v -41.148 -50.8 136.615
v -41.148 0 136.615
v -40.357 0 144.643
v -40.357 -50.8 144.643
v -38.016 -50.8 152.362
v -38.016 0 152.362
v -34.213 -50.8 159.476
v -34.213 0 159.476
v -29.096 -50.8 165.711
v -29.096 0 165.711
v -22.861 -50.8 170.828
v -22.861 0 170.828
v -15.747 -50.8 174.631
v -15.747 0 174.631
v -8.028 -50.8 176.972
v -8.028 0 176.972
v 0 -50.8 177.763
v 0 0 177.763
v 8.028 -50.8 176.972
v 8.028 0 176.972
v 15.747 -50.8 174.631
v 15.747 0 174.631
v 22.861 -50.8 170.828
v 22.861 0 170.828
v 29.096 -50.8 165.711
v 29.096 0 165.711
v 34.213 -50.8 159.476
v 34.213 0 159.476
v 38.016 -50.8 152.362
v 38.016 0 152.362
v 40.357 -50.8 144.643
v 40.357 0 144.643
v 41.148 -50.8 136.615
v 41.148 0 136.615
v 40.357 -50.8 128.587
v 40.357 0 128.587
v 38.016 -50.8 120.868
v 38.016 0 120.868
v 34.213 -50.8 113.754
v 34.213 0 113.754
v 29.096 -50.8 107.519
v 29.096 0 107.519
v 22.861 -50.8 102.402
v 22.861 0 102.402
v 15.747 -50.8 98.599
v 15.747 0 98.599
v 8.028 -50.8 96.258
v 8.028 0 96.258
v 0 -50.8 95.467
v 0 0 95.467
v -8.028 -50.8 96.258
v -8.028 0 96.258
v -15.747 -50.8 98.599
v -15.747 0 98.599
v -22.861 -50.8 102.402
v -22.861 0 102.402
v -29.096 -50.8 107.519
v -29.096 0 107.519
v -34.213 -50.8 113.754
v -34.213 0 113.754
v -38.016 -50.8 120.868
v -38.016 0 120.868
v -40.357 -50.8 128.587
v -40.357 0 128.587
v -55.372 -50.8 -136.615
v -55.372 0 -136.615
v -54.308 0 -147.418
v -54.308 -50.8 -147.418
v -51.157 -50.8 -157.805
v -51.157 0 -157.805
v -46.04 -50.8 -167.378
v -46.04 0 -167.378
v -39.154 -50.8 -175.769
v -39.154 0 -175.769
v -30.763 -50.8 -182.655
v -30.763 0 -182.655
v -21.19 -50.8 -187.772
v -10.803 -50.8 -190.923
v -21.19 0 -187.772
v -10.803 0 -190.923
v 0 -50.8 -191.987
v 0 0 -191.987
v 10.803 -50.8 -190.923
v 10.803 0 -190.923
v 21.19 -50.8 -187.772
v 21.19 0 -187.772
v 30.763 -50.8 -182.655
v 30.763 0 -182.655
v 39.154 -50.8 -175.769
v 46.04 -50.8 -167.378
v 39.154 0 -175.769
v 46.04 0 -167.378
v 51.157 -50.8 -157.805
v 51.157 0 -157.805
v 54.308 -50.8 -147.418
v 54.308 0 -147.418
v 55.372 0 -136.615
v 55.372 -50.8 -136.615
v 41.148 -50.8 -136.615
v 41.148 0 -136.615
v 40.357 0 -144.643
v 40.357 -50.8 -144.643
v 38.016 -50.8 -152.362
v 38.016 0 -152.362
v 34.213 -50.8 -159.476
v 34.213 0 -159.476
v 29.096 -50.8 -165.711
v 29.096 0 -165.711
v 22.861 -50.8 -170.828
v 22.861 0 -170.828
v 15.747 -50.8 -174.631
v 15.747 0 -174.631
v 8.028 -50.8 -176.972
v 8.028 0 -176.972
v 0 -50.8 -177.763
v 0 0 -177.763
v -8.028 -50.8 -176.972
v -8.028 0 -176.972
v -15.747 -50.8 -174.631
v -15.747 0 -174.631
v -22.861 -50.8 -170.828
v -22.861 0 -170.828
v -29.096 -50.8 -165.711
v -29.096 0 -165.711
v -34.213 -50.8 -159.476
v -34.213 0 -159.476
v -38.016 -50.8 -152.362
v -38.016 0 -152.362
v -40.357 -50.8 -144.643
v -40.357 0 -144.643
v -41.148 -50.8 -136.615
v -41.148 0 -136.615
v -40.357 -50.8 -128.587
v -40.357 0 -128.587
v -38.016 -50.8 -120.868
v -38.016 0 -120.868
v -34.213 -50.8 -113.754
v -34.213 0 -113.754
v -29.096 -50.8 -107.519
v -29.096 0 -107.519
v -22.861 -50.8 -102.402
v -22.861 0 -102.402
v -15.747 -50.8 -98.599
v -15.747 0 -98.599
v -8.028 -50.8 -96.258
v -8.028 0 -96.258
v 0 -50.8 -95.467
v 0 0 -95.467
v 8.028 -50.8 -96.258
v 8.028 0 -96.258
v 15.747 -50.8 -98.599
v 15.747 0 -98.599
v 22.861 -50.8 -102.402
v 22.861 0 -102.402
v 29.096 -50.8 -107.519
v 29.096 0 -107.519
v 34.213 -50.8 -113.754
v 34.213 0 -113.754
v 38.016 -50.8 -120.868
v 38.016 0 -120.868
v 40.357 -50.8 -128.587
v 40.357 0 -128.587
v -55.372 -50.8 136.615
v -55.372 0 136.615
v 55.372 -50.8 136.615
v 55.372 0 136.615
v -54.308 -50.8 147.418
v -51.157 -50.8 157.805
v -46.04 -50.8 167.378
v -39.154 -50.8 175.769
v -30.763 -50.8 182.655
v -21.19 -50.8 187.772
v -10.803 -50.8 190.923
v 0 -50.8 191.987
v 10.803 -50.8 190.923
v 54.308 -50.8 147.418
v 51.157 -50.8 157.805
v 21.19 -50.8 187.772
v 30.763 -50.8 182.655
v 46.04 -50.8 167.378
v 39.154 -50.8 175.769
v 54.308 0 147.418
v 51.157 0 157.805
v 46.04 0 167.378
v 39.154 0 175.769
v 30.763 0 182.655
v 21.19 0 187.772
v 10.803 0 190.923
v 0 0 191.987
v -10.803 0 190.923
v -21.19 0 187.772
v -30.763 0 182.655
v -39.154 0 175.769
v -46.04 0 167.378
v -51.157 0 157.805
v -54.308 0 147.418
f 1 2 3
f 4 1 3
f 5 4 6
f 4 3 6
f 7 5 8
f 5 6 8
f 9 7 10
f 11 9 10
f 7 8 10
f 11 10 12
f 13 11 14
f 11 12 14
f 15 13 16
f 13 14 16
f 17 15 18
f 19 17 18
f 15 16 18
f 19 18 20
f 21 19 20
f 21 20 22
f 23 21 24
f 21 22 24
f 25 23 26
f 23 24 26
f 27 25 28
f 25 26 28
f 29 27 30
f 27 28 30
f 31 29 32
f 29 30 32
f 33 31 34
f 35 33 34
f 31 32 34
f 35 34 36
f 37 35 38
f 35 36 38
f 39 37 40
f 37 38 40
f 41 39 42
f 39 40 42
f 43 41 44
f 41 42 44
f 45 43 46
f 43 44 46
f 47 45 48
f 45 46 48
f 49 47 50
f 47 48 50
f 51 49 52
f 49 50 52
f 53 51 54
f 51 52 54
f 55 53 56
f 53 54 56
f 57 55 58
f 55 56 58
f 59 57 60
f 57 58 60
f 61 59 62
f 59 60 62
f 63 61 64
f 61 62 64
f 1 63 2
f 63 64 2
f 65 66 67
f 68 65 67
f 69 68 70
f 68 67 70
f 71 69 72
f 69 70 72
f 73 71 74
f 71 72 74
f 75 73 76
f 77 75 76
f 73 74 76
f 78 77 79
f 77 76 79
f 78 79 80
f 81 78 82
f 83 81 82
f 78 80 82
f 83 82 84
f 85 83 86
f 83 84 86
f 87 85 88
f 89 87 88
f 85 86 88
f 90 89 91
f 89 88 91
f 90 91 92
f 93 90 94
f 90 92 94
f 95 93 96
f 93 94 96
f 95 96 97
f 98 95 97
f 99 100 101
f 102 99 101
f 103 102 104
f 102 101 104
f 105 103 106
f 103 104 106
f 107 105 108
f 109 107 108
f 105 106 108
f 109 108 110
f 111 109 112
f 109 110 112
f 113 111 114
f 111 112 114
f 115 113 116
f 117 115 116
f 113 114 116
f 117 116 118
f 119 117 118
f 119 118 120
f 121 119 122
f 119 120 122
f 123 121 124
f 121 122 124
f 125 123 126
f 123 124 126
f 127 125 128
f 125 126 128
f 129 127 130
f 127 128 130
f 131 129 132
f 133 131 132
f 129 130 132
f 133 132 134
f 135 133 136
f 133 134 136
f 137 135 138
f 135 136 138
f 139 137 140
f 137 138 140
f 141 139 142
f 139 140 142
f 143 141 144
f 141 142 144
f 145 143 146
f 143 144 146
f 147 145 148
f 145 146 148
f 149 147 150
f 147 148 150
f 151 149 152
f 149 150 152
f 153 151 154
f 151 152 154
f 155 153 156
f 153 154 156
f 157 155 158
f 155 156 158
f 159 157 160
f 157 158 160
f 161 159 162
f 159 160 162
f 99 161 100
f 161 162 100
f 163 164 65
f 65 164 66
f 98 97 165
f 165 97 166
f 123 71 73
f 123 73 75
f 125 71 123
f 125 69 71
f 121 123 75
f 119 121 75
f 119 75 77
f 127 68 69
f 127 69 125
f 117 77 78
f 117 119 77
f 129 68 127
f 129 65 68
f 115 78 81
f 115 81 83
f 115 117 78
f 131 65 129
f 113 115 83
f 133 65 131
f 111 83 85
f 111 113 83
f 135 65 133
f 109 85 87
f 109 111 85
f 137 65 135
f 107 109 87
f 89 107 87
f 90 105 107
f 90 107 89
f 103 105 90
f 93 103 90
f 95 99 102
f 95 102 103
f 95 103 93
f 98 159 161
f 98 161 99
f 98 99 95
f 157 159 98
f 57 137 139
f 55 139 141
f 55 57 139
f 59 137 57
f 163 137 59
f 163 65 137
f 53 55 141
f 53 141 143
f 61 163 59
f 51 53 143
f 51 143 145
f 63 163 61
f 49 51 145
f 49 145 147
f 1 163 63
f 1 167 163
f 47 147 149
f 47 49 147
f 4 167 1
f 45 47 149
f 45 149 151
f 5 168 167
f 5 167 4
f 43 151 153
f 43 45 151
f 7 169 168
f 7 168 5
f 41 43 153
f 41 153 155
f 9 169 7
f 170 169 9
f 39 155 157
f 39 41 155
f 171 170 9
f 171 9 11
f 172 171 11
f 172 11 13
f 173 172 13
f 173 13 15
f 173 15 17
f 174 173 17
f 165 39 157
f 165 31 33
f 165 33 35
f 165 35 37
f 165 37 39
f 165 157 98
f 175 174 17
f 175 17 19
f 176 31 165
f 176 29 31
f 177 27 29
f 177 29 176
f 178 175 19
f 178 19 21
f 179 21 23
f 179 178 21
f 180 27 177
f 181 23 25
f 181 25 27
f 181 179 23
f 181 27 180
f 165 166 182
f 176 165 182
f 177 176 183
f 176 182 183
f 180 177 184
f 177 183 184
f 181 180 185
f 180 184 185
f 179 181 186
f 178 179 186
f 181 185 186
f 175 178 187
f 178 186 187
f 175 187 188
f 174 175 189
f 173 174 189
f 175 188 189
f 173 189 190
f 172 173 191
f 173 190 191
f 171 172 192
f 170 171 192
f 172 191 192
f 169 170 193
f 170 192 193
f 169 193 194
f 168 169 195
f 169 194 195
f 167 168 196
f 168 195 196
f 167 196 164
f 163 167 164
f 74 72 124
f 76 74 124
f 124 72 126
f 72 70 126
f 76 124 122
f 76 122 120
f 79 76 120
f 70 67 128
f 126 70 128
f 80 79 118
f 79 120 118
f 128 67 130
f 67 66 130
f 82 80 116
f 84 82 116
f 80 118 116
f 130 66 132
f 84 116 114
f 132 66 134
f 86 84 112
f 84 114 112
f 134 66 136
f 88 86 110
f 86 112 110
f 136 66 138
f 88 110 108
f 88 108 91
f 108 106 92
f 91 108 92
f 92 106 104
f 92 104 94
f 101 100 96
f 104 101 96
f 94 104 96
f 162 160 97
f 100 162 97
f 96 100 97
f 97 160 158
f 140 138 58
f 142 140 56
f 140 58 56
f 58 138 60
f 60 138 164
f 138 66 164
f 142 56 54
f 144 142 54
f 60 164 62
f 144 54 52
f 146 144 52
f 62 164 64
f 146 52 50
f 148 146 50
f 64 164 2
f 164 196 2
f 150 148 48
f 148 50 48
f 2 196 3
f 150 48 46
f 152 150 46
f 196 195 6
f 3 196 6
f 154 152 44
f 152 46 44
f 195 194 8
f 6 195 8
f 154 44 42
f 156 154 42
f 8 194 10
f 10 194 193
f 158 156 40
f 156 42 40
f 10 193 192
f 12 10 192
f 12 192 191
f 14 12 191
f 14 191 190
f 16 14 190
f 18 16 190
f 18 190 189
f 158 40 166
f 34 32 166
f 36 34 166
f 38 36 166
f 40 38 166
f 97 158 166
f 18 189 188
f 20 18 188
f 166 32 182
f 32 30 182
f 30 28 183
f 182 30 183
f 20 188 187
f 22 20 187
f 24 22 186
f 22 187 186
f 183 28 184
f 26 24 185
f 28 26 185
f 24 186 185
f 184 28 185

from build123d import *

# Parameters (mm, degrees)
F1_DEPTH = 50.8


with BuildPart() as f1:
    # F0 (on Front) → F1 (new body)
    with BuildSketch(Plane.XZ):
        with BuildLine():
            ThreePointArc((-55.372, 136.61499), (0, 81.24299), (55.372, 136.61499))
            Line((55.372, 136.61499), (41.148, 136.61499))
            ThreePointArc((41.148, 136.61499), (0, 95.46699), (-41.148, 136.61499))
            Line((-41.148, 136.61499), (-55.372, 136.61499))
        make_face()
        with BuildLine():
            Line((41.148, 136.61499), (55.372, 136.61499))
            ThreePointArc((55.372, 136.61499), (0, 191.98699), (-55.372, 136.61499))
            Line((-55.372, 136.61499), (-41.148, 136.61499))
            ThreePointArc((-41.148, 136.61499), (0, 177.76299), (41.148, 136.61499))
        make_face()
        with BuildLine():
            ThreePointArc((-55.372, -136.61499), (0, -81.24299), (55.372, -136.61499))
            Line((55.372, -136.61499), (55.372, 136.61499))
            ThreePointArc((55.372, 136.61499), (0, 81.24299), (-55.372, 136.61499))
            Line((-55.372, 136.61499), (-55.372, -136.61499))
        make_face()
        with BuildLine():
            Line((41.148, -136.61499), (55.372, -136.61499))
            ThreePointArc((55.372, -136.61499), (0, -81.24299), (-55.372, -136.61499))
            Line((-55.372, -136.61499), (-41.148, -136.61499))
            ThreePointArc((-41.148, -136.61499), (0, -95.46699), (41.148, -136.61499))
        make_face()
        with BuildLine():
            ThreePointArc((-55.372, -136.61499), (0, -191.98699), (55.372, -136.61499))
            Line((55.372, -136.61499), (41.148, -136.61499))
            ThreePointArc((41.148, -136.61499), (0, -177.76299), (-41.148, -136.61499))
            Line((-41.148, -136.61499), (-55.372, -136.61499))
        make_face()
    extrude(amount=F1_DEPTH)


solid = f1.part
